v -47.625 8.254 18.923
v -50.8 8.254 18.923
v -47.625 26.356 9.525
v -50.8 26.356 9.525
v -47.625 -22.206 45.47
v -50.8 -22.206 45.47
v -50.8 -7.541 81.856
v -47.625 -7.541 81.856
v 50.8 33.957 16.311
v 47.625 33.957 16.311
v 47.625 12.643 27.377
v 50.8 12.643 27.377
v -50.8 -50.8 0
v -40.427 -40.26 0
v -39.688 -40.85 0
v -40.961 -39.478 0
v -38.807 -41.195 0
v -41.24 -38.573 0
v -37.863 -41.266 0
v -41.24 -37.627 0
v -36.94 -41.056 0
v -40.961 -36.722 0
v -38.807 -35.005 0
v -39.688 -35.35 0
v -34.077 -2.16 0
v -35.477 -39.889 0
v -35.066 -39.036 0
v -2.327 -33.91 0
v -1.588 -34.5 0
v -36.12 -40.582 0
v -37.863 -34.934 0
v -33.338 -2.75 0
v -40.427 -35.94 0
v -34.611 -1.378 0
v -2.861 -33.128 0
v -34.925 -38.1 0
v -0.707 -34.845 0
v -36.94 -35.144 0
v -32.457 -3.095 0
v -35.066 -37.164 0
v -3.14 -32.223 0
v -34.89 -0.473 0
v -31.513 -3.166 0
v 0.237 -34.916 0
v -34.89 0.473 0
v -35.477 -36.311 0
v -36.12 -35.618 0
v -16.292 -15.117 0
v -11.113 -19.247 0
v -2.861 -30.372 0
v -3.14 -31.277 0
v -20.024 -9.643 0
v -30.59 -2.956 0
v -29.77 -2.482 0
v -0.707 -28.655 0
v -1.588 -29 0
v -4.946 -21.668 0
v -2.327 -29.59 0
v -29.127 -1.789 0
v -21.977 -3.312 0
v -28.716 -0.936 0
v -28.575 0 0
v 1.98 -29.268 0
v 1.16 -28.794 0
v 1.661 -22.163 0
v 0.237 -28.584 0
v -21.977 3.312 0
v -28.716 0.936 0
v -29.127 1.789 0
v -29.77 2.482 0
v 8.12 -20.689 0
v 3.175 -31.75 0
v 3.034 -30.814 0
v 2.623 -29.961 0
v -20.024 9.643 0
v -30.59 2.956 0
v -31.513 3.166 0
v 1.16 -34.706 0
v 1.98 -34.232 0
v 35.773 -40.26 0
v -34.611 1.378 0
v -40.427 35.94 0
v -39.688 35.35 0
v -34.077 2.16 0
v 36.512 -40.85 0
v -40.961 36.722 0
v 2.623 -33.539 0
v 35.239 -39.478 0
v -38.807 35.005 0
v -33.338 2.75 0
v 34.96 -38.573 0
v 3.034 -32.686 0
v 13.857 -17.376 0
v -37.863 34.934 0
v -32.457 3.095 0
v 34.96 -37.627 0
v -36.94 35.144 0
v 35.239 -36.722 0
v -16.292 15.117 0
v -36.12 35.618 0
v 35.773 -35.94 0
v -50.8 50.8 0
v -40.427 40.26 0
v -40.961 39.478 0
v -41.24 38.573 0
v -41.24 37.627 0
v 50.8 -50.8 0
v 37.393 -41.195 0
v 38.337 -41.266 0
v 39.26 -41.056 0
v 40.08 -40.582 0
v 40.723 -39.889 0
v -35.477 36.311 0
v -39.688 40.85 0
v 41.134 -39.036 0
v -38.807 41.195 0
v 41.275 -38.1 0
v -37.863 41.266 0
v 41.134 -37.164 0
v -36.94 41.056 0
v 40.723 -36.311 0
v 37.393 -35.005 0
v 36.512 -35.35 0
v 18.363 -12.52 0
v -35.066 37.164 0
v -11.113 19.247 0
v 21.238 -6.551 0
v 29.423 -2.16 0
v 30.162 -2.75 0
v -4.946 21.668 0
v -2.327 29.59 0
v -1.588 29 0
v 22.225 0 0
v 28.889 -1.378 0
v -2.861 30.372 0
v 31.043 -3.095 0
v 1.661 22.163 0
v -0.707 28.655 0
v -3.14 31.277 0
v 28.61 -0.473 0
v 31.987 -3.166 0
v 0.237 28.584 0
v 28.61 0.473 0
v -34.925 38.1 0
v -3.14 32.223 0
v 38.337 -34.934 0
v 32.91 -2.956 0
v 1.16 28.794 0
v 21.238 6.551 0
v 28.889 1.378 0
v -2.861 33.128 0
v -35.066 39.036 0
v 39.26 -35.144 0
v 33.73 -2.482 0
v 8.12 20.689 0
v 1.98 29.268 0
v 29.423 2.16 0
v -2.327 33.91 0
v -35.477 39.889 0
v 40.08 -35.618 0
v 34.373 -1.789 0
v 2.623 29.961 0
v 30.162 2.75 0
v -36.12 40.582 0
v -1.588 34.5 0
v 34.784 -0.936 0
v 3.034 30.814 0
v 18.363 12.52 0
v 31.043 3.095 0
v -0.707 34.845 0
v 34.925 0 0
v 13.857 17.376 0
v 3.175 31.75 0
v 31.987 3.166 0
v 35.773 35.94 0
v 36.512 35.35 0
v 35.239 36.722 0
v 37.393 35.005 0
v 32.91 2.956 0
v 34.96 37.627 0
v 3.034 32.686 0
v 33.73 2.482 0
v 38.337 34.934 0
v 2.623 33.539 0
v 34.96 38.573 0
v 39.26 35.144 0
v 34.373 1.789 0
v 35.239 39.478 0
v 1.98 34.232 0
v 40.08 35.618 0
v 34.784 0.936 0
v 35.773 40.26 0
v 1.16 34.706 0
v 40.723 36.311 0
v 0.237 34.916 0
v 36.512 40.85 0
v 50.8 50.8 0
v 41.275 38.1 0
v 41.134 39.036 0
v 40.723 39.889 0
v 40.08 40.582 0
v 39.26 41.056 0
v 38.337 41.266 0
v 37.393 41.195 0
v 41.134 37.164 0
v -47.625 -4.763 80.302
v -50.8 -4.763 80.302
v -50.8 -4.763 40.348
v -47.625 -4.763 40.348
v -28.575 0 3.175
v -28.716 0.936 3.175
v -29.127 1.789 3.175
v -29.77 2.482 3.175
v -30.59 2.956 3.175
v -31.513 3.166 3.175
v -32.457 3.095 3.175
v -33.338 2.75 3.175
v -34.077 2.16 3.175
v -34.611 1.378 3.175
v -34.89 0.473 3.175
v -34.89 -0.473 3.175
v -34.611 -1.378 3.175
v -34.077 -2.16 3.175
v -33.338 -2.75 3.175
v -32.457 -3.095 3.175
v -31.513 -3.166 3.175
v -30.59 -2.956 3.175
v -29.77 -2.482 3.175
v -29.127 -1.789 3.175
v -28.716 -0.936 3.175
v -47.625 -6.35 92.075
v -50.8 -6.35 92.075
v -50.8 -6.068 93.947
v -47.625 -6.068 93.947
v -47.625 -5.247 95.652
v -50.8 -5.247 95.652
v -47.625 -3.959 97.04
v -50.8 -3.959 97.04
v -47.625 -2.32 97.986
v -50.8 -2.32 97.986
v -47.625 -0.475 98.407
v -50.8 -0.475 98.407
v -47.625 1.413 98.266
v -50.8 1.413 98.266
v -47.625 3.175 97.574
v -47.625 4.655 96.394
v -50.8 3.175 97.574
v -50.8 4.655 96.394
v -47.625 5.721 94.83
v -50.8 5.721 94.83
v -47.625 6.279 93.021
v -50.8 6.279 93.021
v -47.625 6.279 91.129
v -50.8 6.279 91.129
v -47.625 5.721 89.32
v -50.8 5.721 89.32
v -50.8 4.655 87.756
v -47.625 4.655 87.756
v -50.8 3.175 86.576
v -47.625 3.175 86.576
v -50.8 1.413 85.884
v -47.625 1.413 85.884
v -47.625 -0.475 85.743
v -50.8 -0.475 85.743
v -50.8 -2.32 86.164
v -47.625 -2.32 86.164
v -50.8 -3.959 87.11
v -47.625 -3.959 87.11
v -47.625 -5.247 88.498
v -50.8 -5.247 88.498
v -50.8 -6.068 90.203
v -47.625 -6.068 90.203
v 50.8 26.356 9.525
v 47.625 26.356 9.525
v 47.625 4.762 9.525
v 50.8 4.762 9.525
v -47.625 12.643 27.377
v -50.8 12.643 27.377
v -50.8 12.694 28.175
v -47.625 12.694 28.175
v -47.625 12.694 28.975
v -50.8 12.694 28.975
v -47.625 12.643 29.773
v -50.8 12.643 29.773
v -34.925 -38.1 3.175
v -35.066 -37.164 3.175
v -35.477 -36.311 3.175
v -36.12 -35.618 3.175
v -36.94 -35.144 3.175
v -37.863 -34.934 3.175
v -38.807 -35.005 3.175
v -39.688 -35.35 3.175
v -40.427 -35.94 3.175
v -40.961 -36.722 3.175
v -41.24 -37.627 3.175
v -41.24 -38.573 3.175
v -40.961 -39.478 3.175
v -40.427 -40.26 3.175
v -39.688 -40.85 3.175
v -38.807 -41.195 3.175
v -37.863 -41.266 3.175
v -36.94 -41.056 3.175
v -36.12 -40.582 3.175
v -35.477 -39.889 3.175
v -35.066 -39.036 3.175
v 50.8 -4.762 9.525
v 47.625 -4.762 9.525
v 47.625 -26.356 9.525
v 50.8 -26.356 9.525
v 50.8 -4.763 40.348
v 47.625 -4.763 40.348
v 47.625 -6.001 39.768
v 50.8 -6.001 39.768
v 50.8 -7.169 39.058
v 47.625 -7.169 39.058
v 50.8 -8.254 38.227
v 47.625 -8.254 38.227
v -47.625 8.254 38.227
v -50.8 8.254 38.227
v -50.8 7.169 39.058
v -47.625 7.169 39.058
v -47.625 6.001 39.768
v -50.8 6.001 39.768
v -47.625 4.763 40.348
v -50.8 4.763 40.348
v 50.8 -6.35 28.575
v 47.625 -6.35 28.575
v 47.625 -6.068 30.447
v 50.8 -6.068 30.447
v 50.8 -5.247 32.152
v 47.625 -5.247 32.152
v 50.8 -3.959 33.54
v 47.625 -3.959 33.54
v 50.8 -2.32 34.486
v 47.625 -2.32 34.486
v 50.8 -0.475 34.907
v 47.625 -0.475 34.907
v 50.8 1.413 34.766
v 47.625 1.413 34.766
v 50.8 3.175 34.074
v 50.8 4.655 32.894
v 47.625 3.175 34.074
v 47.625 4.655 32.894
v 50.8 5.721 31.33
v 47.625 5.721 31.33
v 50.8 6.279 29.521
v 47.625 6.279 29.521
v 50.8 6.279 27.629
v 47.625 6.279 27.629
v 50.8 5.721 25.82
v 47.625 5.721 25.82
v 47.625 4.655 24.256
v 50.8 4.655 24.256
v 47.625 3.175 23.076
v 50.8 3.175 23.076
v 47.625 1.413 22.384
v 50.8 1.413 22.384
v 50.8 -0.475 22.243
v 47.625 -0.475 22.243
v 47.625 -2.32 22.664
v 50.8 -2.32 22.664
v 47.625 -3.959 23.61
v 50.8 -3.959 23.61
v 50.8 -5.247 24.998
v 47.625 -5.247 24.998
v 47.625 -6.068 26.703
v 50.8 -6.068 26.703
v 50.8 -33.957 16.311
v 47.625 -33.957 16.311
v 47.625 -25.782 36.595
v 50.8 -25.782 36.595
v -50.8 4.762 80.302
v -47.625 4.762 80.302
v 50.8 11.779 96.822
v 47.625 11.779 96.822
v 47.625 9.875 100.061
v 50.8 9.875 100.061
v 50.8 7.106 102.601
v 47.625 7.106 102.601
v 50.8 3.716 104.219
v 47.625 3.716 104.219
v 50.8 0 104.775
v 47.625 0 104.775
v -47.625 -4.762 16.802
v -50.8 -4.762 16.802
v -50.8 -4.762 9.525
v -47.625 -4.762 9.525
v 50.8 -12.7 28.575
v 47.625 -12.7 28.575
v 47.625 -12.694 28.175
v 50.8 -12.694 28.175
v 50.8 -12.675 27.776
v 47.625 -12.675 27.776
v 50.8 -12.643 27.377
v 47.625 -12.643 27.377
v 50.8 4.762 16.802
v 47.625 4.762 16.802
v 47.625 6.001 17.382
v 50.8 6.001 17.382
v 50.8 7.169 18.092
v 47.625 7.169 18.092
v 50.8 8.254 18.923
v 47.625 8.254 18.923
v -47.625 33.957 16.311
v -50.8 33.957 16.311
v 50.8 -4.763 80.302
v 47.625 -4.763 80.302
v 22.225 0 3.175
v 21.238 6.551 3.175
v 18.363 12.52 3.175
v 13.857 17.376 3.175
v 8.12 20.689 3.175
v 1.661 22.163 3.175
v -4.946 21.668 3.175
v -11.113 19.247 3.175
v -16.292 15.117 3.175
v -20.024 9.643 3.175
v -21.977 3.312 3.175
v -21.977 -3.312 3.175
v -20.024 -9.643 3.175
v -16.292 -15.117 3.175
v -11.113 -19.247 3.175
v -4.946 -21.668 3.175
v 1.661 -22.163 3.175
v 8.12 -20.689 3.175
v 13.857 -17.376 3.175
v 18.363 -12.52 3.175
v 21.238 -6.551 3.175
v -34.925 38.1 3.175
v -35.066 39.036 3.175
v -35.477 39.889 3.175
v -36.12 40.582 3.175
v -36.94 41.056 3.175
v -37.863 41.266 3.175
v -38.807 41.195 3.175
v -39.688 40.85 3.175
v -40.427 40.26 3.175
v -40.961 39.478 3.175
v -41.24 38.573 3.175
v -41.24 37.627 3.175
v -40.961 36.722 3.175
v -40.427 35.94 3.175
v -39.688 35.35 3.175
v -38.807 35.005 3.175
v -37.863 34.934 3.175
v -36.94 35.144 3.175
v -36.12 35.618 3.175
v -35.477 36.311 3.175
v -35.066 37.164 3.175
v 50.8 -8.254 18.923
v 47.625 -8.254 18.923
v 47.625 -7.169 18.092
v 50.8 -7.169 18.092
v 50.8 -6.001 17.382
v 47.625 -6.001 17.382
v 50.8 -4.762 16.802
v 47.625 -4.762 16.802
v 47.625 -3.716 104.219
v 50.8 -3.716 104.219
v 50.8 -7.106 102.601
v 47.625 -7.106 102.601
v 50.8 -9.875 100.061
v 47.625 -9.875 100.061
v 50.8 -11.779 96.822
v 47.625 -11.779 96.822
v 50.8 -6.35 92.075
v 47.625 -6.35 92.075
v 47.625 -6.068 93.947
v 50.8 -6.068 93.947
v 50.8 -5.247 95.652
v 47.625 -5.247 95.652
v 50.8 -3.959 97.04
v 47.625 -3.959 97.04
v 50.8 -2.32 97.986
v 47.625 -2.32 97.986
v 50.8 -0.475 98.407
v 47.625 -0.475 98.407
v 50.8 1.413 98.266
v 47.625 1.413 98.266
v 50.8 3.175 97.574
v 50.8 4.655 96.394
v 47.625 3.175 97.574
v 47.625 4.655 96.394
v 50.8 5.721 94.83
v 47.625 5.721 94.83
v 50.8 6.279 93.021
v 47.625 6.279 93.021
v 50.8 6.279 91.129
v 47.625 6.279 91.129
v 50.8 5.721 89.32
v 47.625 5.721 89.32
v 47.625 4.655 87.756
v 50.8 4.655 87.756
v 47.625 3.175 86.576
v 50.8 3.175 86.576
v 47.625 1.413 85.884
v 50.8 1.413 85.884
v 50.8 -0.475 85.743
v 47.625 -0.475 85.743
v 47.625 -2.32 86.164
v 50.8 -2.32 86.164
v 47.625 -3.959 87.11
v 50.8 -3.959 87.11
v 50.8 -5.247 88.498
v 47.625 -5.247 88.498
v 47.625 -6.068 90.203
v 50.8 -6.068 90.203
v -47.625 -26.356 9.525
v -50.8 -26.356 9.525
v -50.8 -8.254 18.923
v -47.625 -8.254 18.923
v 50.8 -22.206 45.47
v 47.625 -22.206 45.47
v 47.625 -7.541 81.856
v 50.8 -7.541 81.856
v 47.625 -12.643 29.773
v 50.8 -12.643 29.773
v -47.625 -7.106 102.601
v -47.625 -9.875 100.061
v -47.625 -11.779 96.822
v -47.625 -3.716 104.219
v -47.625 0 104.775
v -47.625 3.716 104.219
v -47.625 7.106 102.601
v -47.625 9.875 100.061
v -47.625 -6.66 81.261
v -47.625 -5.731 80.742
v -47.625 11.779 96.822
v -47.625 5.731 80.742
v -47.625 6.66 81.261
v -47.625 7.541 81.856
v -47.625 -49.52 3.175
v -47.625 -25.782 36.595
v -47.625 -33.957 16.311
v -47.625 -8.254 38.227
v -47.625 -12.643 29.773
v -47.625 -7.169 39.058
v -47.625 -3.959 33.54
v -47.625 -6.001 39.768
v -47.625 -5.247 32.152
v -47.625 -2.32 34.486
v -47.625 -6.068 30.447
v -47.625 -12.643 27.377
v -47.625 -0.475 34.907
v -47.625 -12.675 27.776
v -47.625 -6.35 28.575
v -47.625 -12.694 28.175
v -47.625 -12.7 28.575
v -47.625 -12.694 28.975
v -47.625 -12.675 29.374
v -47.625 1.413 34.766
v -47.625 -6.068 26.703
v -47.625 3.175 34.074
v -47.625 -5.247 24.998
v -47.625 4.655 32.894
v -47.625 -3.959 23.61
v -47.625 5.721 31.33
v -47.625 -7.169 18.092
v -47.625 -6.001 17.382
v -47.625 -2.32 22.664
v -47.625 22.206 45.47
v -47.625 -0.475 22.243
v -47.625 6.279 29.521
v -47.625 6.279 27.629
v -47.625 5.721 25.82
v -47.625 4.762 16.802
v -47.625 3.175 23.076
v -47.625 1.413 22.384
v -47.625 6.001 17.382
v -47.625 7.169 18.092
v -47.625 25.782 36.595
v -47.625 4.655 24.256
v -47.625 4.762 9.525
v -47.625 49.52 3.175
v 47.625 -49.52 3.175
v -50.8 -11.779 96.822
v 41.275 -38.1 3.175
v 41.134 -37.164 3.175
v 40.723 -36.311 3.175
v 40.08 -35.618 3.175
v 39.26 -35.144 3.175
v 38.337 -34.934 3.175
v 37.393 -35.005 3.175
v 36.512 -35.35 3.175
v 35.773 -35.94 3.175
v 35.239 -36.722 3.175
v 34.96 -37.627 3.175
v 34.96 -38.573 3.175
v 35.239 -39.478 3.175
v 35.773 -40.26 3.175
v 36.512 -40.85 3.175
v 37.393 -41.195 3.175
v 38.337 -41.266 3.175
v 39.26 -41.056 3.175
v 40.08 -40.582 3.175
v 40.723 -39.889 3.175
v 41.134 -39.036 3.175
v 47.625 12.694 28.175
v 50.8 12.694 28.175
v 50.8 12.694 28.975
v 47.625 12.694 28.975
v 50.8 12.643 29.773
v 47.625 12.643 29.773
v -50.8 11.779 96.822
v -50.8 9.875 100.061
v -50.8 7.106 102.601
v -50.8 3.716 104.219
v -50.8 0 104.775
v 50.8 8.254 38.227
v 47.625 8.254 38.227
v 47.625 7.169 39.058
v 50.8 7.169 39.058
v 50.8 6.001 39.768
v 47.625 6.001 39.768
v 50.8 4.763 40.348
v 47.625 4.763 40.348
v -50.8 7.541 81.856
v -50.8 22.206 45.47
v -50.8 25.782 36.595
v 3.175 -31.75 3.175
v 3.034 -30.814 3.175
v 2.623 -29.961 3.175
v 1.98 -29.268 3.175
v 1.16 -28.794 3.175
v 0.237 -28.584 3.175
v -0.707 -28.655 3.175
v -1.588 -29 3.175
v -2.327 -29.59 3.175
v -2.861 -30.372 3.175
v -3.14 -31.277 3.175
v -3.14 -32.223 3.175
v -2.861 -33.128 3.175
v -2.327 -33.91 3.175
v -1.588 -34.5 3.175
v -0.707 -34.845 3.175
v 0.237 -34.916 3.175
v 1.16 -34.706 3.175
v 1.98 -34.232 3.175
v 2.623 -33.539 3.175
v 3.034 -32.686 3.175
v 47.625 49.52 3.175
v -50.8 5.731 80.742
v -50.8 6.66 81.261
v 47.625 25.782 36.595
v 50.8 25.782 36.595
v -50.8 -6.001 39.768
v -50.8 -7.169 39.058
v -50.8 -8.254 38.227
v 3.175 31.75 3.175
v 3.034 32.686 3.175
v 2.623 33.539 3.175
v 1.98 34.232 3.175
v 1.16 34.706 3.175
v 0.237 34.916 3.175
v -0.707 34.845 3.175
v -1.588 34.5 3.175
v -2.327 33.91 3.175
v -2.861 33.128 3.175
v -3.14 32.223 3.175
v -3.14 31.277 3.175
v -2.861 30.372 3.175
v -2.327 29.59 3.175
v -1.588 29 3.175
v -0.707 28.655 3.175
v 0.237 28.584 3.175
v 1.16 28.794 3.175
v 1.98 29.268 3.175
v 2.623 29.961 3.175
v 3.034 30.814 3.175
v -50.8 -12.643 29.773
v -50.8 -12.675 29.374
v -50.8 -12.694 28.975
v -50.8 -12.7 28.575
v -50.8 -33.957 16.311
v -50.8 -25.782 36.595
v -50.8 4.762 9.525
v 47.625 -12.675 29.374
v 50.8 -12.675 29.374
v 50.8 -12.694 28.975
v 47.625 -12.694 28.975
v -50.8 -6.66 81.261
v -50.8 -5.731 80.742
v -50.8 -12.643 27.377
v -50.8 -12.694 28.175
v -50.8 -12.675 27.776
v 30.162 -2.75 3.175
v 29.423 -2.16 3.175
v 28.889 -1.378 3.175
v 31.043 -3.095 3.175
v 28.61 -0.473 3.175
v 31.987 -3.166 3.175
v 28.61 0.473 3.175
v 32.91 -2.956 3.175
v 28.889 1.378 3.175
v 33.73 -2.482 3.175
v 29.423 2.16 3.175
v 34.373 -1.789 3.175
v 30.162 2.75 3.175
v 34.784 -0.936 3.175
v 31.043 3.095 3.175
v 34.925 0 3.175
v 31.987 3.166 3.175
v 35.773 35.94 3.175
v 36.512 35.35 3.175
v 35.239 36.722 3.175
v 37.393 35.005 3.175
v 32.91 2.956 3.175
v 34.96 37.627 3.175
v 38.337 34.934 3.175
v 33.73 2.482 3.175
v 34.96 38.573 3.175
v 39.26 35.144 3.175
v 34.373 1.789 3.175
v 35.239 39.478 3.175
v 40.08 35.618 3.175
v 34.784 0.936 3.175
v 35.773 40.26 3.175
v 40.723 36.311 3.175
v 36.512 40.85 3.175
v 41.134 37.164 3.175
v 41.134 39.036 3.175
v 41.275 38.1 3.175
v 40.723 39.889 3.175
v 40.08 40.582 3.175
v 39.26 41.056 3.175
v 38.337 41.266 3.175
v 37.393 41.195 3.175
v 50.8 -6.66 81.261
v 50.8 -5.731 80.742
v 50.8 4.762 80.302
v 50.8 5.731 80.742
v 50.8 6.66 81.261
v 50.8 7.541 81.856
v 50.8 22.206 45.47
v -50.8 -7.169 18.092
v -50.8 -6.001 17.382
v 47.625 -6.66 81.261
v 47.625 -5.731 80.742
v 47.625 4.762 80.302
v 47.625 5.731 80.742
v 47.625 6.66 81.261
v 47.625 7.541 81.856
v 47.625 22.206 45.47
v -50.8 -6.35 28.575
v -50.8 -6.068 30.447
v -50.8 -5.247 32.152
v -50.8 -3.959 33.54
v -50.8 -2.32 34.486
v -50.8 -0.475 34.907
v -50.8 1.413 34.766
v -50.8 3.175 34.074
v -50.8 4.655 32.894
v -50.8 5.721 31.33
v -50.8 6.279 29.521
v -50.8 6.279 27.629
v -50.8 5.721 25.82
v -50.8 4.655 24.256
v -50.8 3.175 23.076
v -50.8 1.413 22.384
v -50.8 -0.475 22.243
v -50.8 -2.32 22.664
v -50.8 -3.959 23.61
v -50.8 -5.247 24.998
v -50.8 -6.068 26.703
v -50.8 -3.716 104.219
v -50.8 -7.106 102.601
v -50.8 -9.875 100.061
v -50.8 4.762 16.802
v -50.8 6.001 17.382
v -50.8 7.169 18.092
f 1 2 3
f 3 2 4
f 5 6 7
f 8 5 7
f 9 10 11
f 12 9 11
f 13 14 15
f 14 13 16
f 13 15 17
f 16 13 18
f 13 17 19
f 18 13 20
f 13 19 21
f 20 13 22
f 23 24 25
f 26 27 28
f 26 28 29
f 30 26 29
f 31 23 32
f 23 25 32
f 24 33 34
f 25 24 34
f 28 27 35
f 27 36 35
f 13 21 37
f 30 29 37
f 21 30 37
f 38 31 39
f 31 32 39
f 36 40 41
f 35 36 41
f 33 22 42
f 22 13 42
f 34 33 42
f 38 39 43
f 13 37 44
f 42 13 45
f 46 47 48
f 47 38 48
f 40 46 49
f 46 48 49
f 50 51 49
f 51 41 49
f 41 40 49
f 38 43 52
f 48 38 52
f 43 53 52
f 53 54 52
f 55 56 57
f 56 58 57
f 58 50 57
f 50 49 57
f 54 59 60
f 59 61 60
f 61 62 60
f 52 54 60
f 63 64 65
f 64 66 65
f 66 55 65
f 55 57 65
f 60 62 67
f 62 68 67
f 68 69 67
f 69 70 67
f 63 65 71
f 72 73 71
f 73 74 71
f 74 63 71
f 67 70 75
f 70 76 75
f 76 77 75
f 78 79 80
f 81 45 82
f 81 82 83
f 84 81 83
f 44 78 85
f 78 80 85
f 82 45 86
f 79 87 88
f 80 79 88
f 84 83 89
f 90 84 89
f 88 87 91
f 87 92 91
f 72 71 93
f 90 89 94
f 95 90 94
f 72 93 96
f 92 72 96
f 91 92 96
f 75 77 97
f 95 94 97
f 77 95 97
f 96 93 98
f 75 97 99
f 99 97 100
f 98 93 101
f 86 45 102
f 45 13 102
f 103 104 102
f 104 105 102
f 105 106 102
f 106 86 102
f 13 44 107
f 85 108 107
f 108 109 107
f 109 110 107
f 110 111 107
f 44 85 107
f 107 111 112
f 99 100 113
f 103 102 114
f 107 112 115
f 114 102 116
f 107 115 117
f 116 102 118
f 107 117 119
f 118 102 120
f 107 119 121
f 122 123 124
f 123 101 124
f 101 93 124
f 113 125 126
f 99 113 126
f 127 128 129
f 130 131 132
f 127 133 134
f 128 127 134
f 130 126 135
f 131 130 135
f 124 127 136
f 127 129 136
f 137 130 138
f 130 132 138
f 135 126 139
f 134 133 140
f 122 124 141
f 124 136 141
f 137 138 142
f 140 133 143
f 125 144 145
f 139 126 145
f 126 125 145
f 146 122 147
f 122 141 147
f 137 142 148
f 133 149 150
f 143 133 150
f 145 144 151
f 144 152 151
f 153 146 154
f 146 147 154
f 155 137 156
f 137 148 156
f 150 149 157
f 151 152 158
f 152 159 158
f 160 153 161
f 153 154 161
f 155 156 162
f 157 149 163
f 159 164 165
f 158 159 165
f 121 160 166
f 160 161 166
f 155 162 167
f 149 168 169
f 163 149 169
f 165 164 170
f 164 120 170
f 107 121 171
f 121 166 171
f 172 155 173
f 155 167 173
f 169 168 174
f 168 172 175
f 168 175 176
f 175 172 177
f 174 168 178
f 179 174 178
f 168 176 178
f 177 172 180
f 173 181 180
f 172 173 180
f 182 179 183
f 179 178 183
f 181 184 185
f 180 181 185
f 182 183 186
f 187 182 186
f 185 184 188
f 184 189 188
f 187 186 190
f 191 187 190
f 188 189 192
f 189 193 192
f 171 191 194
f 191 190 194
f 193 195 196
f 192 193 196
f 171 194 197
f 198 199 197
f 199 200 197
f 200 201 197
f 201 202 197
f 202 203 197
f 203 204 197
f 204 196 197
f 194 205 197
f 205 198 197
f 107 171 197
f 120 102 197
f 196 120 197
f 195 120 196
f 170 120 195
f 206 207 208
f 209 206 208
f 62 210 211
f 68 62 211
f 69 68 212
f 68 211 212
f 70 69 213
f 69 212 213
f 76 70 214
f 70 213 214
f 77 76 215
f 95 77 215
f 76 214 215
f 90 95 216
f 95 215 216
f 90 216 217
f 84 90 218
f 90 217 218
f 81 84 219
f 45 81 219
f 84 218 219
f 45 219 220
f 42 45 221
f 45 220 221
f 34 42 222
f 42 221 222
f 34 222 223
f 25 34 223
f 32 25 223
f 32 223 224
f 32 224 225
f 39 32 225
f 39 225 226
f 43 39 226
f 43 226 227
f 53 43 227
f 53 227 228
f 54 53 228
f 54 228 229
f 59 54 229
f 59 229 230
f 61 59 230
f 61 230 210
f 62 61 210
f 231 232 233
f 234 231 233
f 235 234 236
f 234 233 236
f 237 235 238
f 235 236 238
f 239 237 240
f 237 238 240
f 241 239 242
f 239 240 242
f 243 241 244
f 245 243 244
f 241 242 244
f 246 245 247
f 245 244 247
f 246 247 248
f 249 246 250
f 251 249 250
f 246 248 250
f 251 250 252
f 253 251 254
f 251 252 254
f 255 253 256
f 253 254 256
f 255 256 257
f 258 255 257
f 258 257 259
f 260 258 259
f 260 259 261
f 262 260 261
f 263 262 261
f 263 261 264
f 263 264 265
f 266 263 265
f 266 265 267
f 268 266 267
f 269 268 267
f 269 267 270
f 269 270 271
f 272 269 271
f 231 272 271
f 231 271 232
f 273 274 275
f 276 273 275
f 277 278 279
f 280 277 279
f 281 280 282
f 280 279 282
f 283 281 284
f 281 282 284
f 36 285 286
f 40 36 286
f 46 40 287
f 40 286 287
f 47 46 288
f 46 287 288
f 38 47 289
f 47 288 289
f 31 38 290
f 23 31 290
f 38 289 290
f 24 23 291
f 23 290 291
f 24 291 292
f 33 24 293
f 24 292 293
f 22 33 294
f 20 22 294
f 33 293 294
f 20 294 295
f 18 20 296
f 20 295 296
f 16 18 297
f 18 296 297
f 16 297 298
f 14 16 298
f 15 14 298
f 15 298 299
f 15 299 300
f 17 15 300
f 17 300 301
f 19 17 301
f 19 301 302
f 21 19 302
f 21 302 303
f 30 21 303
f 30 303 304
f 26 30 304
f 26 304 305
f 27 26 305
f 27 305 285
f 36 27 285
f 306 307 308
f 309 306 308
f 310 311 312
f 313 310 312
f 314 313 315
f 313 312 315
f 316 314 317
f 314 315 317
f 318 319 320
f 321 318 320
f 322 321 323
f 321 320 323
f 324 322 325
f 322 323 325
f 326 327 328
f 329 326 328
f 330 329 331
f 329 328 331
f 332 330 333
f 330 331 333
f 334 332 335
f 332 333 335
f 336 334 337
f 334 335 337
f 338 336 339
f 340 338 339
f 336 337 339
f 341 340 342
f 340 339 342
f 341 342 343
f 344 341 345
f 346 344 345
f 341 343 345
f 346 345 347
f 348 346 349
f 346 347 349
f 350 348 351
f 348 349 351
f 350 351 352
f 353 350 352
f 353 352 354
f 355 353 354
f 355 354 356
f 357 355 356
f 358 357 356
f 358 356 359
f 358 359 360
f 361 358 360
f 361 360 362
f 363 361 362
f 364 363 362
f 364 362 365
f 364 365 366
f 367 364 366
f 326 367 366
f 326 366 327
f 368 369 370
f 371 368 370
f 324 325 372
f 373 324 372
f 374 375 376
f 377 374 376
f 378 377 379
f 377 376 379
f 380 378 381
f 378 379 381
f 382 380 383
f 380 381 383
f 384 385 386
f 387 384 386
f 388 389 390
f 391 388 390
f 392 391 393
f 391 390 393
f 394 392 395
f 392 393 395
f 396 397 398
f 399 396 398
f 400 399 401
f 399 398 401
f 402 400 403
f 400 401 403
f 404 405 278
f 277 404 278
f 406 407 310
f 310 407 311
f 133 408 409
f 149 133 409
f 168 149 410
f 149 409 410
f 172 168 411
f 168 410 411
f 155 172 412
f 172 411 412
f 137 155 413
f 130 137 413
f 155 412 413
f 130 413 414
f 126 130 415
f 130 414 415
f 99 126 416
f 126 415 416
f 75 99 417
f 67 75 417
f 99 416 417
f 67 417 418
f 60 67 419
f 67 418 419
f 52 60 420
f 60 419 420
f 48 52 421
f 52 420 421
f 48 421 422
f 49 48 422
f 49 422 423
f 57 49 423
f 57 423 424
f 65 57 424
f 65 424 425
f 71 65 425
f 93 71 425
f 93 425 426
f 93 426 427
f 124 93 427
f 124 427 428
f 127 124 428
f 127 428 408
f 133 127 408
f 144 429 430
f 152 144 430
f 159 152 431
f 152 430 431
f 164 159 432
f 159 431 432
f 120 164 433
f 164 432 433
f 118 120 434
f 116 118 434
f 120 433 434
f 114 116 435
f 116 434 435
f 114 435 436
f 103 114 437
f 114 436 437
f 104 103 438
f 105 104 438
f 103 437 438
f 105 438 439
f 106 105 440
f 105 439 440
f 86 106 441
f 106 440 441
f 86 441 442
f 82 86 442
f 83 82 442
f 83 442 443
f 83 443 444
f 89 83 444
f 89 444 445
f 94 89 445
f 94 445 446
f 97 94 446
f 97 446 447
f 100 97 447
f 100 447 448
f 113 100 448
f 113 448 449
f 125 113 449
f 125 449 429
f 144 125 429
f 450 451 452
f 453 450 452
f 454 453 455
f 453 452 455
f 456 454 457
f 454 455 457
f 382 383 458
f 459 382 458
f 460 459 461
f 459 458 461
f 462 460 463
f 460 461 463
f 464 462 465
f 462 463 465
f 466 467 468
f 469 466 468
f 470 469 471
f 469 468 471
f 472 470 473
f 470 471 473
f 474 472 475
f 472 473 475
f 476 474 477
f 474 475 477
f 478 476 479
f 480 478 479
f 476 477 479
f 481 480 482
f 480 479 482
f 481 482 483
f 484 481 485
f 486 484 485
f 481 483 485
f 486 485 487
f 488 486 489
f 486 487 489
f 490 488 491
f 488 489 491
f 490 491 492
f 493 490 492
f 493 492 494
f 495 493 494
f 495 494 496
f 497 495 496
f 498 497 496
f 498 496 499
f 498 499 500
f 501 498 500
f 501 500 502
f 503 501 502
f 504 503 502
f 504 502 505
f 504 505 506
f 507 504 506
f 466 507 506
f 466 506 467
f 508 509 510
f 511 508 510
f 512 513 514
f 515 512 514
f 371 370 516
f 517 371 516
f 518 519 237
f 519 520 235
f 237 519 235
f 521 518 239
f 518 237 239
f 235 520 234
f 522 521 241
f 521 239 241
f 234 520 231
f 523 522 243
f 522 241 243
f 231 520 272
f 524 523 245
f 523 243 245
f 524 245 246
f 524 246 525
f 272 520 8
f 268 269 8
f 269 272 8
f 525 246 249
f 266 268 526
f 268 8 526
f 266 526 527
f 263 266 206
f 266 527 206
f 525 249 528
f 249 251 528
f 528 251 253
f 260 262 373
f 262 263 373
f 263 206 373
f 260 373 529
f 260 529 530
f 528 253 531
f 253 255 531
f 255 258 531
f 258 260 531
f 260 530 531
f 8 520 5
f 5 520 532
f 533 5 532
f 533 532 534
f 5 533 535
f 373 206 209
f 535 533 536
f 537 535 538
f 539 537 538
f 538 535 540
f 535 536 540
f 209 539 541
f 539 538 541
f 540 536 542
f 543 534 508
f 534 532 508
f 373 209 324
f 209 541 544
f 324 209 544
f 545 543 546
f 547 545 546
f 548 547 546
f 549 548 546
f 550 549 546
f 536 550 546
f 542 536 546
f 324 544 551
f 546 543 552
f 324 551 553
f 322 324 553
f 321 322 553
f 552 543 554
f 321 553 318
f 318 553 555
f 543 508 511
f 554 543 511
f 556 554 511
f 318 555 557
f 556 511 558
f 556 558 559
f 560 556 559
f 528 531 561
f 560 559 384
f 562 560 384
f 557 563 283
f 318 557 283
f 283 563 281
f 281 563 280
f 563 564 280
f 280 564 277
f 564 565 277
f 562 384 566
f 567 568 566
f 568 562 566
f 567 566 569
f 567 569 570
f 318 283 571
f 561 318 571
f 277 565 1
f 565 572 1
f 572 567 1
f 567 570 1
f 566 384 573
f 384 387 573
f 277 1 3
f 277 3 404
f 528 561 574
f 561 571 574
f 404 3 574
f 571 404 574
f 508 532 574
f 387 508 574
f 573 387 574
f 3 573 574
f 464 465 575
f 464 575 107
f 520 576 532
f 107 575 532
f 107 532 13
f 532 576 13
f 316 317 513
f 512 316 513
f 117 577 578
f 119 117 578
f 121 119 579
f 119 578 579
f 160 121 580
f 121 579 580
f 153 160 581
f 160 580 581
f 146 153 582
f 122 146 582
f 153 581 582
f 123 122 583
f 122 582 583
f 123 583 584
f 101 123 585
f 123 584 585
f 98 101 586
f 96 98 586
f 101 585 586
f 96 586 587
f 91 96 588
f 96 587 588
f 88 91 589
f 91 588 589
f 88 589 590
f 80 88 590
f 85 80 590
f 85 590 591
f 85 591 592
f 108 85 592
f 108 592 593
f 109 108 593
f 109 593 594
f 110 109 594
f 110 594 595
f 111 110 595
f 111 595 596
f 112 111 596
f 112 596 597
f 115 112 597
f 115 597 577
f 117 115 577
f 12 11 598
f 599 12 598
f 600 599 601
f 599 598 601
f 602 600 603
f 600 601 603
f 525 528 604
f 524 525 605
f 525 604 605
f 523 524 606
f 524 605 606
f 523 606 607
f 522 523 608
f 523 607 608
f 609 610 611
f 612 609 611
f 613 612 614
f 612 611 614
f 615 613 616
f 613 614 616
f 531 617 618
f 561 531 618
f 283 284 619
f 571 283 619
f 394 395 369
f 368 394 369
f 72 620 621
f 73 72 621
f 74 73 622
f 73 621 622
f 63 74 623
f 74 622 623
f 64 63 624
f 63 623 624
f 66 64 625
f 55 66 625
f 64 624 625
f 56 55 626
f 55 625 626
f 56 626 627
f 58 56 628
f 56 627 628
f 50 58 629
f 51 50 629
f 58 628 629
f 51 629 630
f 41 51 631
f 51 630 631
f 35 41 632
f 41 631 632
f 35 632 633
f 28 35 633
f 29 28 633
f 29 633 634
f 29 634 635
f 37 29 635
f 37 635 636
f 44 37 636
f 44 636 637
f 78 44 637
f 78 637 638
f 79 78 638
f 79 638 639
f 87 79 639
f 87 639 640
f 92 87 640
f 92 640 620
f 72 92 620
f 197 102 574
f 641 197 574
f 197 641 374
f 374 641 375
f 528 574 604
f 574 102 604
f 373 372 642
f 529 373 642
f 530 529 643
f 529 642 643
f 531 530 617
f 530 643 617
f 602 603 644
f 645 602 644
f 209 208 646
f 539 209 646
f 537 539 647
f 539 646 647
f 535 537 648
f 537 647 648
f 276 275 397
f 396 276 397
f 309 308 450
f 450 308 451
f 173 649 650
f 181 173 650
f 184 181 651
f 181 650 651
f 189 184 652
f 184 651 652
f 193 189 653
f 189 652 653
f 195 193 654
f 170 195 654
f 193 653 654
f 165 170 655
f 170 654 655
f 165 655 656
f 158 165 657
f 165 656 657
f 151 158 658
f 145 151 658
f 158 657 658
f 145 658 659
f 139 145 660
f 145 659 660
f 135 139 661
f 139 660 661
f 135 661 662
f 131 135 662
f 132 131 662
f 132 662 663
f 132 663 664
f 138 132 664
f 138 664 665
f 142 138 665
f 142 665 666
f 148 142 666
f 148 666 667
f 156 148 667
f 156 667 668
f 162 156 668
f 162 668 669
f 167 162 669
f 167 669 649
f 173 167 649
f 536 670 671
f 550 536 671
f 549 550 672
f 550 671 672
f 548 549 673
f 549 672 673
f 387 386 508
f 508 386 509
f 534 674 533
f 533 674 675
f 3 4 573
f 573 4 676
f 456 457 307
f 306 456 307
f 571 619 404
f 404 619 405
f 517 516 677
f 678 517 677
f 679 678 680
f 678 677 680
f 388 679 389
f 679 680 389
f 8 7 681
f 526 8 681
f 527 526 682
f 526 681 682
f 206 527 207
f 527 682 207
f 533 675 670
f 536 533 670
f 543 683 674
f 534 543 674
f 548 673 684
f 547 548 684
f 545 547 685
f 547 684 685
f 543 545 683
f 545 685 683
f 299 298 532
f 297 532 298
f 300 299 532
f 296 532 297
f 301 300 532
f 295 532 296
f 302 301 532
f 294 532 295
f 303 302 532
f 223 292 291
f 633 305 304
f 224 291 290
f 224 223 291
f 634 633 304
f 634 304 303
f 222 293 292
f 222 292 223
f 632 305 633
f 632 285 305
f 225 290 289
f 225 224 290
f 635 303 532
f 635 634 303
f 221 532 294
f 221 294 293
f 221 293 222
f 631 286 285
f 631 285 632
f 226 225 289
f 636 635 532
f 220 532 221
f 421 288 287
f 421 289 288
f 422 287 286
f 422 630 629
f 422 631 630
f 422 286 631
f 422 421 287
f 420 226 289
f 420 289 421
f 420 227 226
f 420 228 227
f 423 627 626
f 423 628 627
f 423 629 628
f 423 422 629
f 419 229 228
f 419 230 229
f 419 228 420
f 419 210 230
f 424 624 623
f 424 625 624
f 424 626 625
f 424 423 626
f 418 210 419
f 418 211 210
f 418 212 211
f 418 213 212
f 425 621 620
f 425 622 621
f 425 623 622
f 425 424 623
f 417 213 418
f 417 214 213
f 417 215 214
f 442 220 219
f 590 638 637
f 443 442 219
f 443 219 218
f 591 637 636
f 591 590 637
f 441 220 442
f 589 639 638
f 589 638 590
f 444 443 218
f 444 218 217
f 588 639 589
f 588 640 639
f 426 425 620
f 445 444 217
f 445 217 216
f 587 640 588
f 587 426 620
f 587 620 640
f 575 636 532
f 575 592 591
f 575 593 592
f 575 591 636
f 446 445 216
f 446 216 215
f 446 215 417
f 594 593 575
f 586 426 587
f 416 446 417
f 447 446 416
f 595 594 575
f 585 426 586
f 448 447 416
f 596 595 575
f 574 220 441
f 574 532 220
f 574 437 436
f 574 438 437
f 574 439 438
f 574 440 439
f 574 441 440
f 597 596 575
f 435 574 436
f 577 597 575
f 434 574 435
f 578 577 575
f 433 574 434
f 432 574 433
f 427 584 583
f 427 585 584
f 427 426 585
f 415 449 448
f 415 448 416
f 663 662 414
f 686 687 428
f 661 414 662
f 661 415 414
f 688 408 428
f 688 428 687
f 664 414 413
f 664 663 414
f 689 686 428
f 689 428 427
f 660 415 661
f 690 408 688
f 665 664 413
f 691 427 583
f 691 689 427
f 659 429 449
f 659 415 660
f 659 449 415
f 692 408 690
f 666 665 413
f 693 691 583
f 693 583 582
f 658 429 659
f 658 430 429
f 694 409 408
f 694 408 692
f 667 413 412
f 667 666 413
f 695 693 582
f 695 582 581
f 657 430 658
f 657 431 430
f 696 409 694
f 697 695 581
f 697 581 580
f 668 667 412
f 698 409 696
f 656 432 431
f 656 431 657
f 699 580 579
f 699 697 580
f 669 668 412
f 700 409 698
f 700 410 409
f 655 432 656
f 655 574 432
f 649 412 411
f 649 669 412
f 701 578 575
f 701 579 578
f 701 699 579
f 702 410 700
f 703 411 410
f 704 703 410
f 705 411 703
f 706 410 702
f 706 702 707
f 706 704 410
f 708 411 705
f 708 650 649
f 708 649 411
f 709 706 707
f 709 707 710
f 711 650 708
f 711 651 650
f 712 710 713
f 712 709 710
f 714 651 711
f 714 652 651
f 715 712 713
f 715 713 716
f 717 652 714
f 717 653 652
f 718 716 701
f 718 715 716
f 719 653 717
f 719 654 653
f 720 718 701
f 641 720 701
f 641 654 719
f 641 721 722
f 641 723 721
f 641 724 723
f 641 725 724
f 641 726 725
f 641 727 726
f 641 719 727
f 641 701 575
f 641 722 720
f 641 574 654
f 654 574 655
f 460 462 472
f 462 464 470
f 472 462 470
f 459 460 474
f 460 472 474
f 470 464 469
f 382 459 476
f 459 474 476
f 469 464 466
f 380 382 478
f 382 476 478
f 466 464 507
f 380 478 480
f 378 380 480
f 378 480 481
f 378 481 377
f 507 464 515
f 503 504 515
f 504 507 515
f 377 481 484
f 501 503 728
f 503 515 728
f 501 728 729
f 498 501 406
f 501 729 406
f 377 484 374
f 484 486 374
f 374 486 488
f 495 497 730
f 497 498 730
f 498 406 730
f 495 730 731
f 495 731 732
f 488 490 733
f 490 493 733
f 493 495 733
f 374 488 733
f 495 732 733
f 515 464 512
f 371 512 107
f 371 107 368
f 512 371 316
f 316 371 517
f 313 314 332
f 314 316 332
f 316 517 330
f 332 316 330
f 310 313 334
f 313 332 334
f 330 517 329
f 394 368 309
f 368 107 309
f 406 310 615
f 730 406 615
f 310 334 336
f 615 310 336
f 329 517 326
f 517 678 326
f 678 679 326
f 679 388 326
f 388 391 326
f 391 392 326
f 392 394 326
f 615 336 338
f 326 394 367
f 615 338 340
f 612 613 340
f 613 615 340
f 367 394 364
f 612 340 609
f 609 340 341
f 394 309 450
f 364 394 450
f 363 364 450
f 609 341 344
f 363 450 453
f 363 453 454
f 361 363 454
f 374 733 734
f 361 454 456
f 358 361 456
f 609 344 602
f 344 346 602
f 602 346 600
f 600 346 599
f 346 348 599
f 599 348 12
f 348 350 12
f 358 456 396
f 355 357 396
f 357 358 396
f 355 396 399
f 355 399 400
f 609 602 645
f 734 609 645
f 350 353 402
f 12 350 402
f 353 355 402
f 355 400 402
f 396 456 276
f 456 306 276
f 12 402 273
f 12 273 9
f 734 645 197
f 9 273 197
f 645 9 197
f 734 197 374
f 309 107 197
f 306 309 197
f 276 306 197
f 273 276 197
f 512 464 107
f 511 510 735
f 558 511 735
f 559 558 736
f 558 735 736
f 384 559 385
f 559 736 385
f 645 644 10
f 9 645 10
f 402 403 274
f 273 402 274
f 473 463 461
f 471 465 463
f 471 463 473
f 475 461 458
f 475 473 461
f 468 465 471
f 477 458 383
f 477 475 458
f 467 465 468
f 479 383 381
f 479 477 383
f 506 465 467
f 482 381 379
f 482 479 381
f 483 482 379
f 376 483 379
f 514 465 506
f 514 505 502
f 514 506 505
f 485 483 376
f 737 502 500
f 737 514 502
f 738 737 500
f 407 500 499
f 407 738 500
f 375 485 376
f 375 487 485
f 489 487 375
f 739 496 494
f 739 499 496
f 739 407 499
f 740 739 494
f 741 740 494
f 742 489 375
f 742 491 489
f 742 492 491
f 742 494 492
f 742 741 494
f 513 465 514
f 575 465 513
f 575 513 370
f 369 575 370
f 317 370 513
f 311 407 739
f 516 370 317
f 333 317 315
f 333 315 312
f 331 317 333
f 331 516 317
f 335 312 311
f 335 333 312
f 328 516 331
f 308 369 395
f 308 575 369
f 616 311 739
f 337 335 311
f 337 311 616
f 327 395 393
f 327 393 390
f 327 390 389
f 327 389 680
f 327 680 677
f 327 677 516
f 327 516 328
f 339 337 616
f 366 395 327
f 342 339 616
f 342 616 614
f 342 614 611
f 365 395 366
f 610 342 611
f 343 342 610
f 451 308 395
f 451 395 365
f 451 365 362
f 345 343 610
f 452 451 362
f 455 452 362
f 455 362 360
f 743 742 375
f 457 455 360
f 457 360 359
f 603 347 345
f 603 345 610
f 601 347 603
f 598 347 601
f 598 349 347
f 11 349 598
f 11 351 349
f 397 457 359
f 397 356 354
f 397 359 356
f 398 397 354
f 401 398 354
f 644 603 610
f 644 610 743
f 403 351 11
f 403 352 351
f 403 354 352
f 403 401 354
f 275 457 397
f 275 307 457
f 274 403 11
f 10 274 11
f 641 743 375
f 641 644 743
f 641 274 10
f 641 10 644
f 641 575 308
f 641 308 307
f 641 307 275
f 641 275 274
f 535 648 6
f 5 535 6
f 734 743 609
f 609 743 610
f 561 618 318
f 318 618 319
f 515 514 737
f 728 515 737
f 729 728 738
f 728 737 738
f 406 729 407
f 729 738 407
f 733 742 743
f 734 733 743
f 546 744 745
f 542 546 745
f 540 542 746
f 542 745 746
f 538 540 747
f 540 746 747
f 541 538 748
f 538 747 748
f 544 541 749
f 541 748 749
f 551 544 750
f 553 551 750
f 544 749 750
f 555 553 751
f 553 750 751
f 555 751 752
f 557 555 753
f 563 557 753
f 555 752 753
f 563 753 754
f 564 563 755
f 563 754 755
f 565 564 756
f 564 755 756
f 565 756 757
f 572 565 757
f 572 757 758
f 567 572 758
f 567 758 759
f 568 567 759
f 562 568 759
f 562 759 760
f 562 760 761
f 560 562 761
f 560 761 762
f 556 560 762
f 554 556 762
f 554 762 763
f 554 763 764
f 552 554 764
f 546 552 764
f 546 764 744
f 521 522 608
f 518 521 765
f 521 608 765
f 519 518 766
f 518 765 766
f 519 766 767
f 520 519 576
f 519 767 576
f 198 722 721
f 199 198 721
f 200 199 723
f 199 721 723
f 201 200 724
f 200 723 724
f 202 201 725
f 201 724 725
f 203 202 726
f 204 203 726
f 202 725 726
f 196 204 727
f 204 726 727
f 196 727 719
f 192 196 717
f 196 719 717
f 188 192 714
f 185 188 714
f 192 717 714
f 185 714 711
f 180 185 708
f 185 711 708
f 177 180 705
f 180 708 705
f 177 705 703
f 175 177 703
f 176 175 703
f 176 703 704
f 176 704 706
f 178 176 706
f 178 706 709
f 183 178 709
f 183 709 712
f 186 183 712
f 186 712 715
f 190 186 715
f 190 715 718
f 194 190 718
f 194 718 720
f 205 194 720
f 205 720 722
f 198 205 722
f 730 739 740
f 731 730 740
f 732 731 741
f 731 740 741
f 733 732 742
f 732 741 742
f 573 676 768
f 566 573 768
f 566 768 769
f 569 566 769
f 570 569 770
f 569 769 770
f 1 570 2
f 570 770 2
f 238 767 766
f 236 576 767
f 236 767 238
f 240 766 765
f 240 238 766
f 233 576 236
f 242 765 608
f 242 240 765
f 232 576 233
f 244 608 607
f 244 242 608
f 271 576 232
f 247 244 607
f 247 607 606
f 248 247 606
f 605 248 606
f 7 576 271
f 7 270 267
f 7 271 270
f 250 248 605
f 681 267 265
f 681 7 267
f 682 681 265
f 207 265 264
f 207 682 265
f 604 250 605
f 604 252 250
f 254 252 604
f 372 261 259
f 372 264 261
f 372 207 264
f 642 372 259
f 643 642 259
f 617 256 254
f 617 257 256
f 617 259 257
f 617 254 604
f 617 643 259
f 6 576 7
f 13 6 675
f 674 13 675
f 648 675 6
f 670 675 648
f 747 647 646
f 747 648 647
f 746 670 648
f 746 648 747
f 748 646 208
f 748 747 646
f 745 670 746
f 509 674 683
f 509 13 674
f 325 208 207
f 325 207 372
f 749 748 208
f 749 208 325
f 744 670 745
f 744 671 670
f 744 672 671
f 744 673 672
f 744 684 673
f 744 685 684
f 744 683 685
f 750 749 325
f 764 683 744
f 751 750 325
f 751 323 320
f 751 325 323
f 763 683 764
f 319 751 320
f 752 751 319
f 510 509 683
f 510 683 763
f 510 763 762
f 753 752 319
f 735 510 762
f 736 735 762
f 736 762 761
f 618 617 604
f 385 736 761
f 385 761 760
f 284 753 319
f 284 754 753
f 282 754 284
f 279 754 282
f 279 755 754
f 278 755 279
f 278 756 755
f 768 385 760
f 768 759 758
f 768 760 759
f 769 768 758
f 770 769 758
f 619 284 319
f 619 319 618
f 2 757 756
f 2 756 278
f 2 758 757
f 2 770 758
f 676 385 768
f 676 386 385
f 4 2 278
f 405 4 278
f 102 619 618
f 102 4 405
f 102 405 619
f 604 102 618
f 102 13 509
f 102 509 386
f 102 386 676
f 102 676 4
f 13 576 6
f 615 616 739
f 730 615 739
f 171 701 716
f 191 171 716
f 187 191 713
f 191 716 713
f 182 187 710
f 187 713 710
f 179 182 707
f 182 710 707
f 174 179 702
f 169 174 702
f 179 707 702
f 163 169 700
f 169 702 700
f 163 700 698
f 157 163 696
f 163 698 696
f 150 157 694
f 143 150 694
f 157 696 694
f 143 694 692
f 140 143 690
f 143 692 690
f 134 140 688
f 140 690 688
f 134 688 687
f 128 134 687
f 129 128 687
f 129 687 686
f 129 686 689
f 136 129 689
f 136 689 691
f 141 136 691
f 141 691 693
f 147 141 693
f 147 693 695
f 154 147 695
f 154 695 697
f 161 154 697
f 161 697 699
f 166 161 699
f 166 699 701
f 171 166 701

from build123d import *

# Parameters (mm, degrees)
F0_W      = 101.6
F0_H      = 101.6
F1_DEPTH  = 3.175
F2_W      = 3.175
F2_H      = 101.6
F3_DEPTH  = 101.6
F4_W      = 3.175
F4_H      = 101.6
F5_DEPTH  = 101.6
F7_DEPTH  = 101.6
F8_R      = 6.35
F9_DEPTH  = 101.6
F11_DEPTH = 101.6
F12_R     = 3.175
F12_R_2   = 22.225
F13_DEPTH = 25.4


with BuildPart() as f1:
    # F0 (on Top) → F1 (new body)
    with BuildSketch(Plane.XY):
        Rectangle(F0_W, F0_H)
    extrude(amount=F1_DEPTH)

    # F2 (on face) → F3 (join)
    with BuildSketch(Plane.XY.offset(3.175)):
        with Locations((-49.2125, 0)):
            Rectangle(F2_W, F2_H)
    extrude(amount=F3_DEPTH)

    # F4 (on face) → F5 (join)
    with BuildSketch(Plane.XY.offset(3.175)):
        with Locations((49.2125, 0)):
            Rectangle(F4_W, F4_H)
    extrude(amount=F5_DEPTH)

    # F6 (on face) → F7 (cut)
    with BuildSketch(Plane(origin=(-50.8, 0, 0), x_dir=(0, -1, 0), z_dir=(-1, 0, 0))):
        with BuildLine():
            Line((-50.8, 104.775), (-50.8, 0))
            Line((-50.8, 0), (-11.779376, 96.822242))
            ThreePointArc((-11.779376, 96.822242), (-7.106336, 102.600682), (0, 104.775))
            Line((0, 104.775), (-50.8, 104.775))
        make_face()
        with BuildLine():
            Line((11.779376, 96.822242), (50.8, 0))
            Line((50.8, 0), (50.8, 104.775))
            Line((50.8, 104.775), (0, 104.775))
            ThreePointArc((0, 104.775), (7.106336, 102.600682), (11.779376, 96.822242))
        make_face()
    extrude(amount=-F7_DEPTH, mode=Mode.SUBTRACT)

    # F8 (on face) → F9 (cut)
    with BuildSketch(Plane(origin=(-50.8, 0, 0), x_dir=(0, -1, 0), z_dir=(-1, 0, 0))):
        with Locations((0, 28.575)):
            Circle(F8_R)
        with Locations((0, 92.075)):
            Circle(F8_R)
    extrude(amount=-F9_DEPTH, mode=Mode.SUBTRACT)

    # F10 (on face) → F11 (cut)
    with BuildSketch(Plane(origin=(-50.8, 0, 0), x_dir=(0, -1, 0), z_dir=(-1, 0, 0))):
        with BuildLine():
            ThreePointArc((4.7625, 40.348215), (6.59431, 39.428804), (8.25437, 38.226703))
            Line((8.25437, 38.226703), (22.205564, 45.470004))
            Line((22.205564, 45.470004), (7.541341, 81.856479))
            ThreePointArc((7.541341, 81.856479), (6.200838, 80.991697), (4.7625, 80.301785))
            Line((4.7625, 80.301785), (4.7625, 40.348215))
        make_face()
        with BuildLine():
            ThreePointArc((12.643355, 29.773157), (12.685831, 29.174748), (12.7, 28.575))
            ThreePointArc((12.7, 28.575), (12.685831, 27.975252), (12.643355, 27.376843))
            Line((12.643355, 27.376843), (33.957008, 16.311037))
            Line((33.957008, 16.311037), (25.782389, 36.594794))
            Line((25.782389, 36.594794), (12.643355, 29.773157))
        make_face()
        with BuildLine():
            ThreePointArc((-8.25437, 38.226703), (-6.59431, 39.428804), (-4.7625, 40.348215))
            Line((-4.7625, 40.348215), (-4.7625, 80.301785))
            ThreePointArc((-4.7625, 80.301785), (-6.200838, 80.991697), (-7.541341, 81.856479))
            Line((-7.541341, 81.856479), (-22.205564, 45.470004))
            Line((-22.205564, 45.470004), (-8.25437, 38.226703))
        make_face()
        with BuildLine():
            ThreePointArc((-12.643355, 27.376843), (-12.7, 28.575), (-12.643355, 29.773157))
            Line((-12.643355, 29.773157), (-25.782389, 36.594794))
            Line((-25.782389, 36.594794), (-33.957008, 16.311037))
            Line((-33.957008, 16.311037), (-12.643355, 27.376843))
        make_face()
        with BuildLine():
            Line((-4.7625, 9.525), (-4.7625, 16.801785))
            ThreePointArc((-4.7625, 16.801785), (-6.59431, 17.721196), (-8.25437, 18.923297))
            Line((-8.25437, 18.923297), (-26.356264, 9.525))
            Line((-26.356264, 9.525), (-4.7625, 9.525))
        make_face()
        with BuildLine():
            Line((26.356264, 9.525), (8.25437, 18.923297))
            ThreePointArc((8.25437, 18.923297), (6.59431, 17.721196), (4.7625, 16.801785))
            Line((4.7625, 16.801785), (4.7625, 9.525))
            Line((4.7625, 9.525), (26.356264, 9.525))
        make_face()
    extrude(amount=-F11_DEPTH, mode=Mode.SUBTRACT)

    # F12 (on face) → F13 (cut)
    with BuildSketch(Plane.XY.offset(3.175)):
        with Locations((38.1, 38.1)):
            Circle(F12_R)
        with Locations((31.75, 0)):
            Circle(F12_R)
        with Locations((38.1, -38.1)):
            Circle(F12_R)
        Circle(F12_R_2)
        with Locations((0, -31.75)):
            Circle(F12_R)
        with Locations((-31.75, 0)):
            Circle(F12_R)
        with Locations((0, 31.75)):
            Circle(F12_R)
        with Locations((-38.1, 38.1)):
            Circle(F12_R)
        with Locations((-38.1, -38.1)):
            Circle(F12_R)
    extrude(amount=-F13_DEPTH, mode=Mode.SUBTRACT)


solid = f1.part
